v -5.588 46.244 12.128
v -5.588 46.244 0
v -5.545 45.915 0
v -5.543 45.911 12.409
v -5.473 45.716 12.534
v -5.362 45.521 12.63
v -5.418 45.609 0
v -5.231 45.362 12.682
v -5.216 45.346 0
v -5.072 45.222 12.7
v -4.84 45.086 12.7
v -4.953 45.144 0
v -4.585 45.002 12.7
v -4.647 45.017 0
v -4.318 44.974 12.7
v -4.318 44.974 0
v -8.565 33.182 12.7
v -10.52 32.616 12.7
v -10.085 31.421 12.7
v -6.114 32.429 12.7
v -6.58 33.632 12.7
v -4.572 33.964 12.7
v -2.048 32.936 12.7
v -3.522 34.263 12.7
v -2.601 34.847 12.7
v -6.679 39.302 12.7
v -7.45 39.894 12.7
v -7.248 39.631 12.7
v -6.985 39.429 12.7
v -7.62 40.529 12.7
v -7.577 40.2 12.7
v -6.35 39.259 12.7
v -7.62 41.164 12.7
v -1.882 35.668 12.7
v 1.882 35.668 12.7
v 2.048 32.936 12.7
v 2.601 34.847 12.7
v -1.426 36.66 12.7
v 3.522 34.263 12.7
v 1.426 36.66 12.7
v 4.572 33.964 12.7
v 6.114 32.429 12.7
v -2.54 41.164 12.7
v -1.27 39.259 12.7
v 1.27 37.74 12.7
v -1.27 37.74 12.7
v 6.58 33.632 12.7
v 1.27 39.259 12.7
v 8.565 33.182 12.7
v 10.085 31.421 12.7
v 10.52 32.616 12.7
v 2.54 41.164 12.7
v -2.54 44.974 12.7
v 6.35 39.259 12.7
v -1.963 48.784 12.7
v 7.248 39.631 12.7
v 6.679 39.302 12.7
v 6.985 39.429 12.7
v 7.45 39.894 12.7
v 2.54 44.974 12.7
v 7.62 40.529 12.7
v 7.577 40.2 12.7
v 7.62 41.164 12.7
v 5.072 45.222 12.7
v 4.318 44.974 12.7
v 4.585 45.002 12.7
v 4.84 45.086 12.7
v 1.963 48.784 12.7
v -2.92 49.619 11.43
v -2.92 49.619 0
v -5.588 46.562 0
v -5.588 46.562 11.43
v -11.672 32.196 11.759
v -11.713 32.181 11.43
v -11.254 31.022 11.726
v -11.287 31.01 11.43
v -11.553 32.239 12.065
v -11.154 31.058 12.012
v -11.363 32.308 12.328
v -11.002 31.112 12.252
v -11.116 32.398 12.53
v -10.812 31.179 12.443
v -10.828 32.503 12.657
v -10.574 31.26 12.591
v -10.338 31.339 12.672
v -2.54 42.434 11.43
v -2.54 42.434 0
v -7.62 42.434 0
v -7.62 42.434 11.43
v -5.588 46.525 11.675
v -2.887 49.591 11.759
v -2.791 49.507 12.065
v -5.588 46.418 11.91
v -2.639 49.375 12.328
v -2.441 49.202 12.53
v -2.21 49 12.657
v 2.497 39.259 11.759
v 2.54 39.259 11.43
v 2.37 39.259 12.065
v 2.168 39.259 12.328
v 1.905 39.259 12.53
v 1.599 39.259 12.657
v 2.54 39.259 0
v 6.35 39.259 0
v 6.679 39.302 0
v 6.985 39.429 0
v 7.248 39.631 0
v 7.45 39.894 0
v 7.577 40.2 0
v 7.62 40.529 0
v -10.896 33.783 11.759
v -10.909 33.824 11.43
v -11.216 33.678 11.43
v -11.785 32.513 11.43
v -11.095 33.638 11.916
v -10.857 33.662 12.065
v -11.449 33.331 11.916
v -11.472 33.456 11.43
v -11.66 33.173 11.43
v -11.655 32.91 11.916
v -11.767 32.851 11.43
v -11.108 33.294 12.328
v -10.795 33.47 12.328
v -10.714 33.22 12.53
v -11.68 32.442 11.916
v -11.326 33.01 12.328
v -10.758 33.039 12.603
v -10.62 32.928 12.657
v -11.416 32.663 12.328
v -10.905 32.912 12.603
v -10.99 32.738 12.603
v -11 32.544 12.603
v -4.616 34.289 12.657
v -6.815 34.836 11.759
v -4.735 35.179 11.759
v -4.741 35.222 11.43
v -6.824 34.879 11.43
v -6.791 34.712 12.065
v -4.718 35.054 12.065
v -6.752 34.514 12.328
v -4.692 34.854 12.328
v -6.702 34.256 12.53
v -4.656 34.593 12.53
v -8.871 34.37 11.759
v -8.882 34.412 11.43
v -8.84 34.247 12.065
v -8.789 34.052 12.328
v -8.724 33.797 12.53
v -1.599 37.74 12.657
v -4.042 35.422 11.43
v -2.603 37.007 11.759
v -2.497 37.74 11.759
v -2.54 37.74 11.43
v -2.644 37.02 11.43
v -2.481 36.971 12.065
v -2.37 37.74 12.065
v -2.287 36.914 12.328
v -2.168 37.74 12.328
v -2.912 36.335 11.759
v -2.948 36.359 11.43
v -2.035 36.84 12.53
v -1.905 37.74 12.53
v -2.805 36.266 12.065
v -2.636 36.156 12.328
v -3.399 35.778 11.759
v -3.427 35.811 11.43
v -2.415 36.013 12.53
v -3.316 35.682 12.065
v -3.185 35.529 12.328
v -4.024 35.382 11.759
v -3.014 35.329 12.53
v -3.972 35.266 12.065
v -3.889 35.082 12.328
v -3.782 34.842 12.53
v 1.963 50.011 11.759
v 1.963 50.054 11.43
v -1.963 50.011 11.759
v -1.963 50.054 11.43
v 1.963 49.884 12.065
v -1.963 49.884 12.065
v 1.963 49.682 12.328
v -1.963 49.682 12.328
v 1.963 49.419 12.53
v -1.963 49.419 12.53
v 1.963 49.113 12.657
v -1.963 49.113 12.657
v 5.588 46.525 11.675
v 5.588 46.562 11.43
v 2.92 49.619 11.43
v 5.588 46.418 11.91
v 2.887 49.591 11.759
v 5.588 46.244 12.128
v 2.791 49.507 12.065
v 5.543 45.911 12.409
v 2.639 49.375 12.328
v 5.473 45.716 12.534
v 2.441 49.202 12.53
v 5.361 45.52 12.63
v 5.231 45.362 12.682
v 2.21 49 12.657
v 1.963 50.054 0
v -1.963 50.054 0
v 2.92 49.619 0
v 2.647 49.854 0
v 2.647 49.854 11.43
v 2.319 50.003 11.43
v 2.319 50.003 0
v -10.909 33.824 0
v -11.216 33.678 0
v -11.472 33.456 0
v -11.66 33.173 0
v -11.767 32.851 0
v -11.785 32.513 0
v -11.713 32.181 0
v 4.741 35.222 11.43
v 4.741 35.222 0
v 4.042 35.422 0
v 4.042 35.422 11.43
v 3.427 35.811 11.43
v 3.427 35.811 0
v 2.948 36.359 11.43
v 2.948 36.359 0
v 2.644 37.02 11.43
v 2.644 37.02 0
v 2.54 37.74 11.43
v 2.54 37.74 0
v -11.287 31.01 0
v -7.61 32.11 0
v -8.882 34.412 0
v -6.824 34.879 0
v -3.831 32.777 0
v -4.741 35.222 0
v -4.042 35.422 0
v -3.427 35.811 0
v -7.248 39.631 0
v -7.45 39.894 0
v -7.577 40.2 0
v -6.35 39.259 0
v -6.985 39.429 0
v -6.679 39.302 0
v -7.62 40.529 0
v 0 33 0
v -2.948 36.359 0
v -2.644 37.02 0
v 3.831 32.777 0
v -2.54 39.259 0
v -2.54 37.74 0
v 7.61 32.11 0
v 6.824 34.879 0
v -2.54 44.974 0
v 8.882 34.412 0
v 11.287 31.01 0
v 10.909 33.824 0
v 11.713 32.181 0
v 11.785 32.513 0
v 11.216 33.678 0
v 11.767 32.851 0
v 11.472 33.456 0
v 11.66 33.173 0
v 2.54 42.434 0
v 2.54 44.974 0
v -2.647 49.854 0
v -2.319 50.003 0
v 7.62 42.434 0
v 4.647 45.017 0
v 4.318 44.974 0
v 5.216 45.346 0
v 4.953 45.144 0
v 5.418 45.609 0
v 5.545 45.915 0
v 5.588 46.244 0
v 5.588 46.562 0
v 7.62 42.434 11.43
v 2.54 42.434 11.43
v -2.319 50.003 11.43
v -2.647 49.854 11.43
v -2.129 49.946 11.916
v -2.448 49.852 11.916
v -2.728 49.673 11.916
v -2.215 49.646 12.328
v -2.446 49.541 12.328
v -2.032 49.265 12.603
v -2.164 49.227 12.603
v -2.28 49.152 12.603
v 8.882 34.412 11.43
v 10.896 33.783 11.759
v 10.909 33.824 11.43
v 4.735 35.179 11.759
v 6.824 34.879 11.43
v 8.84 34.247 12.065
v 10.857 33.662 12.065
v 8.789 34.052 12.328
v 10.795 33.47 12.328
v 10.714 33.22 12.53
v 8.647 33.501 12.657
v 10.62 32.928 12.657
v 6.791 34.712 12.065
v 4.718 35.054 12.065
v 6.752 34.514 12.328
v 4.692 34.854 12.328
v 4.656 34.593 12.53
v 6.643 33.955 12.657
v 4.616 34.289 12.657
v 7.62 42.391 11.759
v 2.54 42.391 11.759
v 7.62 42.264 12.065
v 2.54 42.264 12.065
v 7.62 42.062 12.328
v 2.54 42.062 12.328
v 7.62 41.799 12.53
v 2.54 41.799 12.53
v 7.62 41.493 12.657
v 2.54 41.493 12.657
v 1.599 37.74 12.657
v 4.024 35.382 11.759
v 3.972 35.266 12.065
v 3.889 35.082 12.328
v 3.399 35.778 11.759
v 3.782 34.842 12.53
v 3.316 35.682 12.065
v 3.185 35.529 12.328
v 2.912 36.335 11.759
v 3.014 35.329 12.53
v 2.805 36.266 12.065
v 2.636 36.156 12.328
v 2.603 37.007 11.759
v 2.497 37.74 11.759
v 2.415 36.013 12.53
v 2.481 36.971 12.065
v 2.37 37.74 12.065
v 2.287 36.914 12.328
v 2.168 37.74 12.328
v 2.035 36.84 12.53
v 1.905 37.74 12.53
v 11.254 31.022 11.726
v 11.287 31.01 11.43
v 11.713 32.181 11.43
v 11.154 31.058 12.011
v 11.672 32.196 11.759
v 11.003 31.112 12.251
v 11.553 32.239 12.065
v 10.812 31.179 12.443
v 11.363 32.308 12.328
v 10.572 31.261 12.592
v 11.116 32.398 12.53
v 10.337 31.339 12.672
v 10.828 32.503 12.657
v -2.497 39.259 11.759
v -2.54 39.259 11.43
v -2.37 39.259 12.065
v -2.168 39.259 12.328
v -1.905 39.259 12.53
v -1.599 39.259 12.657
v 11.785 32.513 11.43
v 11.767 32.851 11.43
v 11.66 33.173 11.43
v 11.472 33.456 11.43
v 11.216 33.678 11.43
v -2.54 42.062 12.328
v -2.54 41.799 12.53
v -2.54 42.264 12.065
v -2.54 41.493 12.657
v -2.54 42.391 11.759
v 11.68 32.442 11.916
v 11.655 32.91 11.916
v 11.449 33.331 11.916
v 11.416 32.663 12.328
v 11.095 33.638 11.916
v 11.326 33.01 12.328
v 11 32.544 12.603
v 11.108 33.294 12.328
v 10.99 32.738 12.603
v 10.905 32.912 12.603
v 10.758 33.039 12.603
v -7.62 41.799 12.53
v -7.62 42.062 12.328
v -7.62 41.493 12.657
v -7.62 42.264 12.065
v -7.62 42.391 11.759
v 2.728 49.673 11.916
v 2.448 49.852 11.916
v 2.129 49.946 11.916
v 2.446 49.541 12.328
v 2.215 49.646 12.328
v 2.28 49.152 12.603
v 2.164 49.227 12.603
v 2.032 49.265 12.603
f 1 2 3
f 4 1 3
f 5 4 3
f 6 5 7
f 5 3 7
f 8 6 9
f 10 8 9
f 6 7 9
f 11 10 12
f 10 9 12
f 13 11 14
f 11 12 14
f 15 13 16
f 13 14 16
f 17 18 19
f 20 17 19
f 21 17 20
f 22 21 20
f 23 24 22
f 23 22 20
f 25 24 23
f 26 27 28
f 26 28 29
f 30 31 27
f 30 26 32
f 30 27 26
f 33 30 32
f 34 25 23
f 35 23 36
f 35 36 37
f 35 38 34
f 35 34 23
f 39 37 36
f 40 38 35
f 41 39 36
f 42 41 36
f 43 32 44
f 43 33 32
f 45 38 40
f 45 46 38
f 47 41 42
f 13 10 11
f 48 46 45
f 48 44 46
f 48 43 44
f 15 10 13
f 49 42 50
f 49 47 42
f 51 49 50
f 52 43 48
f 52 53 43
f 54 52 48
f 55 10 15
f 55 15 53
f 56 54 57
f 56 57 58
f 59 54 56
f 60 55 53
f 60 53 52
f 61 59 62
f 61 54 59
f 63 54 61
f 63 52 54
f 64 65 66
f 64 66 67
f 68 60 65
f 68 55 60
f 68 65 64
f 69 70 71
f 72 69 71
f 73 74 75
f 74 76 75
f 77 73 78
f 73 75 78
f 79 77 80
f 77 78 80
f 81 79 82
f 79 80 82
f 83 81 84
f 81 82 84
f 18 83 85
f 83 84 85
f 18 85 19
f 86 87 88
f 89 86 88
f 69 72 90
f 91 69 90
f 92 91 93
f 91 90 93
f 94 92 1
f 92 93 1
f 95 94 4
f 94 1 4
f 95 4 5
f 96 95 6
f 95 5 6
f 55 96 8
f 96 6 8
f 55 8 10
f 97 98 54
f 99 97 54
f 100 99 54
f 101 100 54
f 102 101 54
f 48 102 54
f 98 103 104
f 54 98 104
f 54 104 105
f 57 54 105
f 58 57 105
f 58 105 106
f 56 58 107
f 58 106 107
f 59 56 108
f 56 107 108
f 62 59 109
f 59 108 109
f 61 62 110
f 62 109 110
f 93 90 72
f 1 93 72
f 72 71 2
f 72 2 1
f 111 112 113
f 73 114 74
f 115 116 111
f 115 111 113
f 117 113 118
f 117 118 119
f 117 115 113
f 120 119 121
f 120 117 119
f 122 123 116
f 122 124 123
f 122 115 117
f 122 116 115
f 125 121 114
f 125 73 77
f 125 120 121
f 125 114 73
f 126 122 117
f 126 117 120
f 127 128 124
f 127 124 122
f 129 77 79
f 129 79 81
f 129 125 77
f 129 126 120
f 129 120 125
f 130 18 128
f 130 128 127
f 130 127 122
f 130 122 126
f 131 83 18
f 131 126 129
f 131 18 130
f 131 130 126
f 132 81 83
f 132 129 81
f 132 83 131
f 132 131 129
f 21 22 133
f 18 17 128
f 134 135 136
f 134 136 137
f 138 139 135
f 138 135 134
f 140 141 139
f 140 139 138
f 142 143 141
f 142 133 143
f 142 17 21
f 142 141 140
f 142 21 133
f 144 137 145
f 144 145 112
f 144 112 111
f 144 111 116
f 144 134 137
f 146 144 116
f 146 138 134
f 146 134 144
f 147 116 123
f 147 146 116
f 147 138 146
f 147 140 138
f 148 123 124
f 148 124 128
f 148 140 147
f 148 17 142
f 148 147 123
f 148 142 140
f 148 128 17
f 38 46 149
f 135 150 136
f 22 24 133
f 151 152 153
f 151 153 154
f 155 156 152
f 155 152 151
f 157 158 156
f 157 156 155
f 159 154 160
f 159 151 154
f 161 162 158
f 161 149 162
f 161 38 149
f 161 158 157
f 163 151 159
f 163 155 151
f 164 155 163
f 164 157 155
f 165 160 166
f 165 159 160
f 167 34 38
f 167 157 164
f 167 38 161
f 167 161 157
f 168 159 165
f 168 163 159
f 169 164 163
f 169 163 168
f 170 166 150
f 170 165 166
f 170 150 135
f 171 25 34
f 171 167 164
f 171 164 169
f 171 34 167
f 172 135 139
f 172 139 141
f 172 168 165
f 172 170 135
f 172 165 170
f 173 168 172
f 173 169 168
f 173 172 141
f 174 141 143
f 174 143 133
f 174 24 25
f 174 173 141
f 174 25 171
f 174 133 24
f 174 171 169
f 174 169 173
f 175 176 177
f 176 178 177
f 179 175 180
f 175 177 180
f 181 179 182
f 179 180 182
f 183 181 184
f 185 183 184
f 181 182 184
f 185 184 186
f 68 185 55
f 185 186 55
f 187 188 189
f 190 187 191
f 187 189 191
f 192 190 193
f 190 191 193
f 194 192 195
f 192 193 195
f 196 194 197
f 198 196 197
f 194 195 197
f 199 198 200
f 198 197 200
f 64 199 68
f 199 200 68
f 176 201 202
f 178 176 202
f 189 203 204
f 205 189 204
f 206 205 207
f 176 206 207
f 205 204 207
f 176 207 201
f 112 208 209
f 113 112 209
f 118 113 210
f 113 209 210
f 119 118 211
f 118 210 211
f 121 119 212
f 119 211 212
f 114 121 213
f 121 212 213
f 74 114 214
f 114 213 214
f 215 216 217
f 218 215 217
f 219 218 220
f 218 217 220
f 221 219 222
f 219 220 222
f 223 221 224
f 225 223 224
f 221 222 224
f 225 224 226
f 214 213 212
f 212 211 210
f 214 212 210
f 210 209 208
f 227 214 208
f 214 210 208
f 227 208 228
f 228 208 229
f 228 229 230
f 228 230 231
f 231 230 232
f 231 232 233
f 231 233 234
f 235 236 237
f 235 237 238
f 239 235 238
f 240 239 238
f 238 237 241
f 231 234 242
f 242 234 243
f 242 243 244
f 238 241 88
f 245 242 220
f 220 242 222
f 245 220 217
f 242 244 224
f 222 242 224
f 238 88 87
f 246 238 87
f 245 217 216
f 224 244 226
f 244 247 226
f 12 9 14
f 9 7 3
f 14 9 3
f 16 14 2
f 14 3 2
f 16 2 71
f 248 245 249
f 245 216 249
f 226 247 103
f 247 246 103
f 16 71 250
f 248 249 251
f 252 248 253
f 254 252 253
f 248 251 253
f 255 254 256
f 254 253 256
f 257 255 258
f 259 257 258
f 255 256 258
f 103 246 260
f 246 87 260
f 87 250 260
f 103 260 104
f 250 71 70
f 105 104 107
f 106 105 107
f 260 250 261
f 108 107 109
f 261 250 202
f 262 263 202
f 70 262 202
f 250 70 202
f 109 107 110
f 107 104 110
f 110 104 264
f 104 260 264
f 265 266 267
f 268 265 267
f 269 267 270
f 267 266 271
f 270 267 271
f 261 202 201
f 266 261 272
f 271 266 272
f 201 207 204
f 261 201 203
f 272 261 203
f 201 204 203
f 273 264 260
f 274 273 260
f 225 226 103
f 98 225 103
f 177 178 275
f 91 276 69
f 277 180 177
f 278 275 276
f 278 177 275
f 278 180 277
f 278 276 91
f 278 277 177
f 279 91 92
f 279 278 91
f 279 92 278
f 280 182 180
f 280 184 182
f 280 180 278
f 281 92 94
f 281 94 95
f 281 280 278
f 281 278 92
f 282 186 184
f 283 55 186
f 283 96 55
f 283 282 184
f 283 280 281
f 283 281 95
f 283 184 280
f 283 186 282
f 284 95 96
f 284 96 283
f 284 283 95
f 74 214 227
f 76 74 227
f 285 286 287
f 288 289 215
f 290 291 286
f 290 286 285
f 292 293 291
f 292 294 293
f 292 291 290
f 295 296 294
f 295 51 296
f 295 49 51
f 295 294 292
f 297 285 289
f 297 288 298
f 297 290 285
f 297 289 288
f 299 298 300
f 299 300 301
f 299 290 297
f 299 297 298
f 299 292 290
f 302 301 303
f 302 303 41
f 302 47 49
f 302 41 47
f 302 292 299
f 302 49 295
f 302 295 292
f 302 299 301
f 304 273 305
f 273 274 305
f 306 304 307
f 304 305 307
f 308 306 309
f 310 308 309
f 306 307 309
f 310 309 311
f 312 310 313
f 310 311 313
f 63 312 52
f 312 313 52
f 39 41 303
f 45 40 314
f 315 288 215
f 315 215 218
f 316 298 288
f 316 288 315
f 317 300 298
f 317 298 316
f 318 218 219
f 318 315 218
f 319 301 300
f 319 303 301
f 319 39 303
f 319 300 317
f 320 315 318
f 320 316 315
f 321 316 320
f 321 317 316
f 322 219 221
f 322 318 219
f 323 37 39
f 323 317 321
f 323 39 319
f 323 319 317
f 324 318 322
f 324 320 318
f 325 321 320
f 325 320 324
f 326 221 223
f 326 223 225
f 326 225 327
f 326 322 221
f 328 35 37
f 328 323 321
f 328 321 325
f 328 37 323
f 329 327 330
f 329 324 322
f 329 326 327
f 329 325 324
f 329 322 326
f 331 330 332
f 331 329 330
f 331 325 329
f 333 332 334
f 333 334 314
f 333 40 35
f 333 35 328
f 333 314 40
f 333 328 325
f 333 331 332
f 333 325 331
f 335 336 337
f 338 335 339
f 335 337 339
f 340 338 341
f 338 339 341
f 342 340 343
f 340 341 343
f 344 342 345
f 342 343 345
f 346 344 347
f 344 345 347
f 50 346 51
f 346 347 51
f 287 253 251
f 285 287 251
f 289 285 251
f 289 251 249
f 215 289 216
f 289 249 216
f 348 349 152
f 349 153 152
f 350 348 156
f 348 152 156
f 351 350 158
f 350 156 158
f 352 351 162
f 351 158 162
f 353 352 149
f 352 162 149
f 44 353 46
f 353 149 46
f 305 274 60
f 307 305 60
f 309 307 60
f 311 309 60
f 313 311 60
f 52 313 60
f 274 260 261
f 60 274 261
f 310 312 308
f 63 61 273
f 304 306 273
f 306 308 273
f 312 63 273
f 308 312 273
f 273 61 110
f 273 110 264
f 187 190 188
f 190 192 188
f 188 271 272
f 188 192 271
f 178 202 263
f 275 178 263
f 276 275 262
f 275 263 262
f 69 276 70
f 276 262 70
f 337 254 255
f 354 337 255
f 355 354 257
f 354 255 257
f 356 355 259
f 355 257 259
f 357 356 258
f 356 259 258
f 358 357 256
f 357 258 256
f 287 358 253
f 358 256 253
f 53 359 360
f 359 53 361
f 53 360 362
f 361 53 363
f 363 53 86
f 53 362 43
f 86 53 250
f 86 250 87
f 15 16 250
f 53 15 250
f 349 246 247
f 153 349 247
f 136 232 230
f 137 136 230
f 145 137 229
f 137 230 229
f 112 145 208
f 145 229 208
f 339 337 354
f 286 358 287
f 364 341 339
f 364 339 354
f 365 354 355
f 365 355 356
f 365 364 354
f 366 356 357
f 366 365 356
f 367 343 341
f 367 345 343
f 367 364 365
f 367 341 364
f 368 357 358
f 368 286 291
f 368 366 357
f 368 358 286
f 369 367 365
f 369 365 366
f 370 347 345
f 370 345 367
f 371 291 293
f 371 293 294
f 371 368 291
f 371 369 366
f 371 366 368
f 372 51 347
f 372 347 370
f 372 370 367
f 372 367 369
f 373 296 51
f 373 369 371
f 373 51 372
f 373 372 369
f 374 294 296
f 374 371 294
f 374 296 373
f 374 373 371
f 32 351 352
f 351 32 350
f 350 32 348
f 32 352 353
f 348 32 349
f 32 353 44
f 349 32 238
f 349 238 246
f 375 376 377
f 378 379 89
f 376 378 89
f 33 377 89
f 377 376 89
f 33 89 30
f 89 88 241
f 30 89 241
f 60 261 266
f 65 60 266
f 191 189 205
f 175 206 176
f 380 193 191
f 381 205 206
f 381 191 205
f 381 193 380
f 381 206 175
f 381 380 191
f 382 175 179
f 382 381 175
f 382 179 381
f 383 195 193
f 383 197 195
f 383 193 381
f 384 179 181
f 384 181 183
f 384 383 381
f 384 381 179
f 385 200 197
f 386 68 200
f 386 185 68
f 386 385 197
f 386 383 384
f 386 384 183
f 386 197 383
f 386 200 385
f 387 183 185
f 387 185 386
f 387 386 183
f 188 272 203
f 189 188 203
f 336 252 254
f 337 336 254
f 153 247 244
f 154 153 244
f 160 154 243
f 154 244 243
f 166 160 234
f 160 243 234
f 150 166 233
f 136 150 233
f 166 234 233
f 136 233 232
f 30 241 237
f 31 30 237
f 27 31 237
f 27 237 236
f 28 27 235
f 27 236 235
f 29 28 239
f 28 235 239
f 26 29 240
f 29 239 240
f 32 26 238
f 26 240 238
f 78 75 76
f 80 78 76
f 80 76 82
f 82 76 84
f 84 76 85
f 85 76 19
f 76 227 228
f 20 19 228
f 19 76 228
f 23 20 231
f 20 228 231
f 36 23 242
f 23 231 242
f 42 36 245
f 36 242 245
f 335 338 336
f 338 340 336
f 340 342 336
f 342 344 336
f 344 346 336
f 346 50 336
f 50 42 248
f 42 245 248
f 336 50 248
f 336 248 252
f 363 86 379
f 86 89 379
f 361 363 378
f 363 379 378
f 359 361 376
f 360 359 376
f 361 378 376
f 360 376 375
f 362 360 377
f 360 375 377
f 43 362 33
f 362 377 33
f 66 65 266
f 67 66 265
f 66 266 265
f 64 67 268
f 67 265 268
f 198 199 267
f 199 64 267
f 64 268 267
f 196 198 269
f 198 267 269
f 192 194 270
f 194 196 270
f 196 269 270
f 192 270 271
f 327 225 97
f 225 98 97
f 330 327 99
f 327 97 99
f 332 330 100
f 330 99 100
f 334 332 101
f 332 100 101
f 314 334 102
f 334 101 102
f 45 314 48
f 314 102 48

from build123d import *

# Parameters (mm, degrees)
F1_DEPTH = 12.7
F2_R     = 1.27


with BuildPart() as f1:
    # F0 (on Top) → F1 (new body)
    with BuildSketch(Plane.XY):
        with BuildLine():
            ThreePointArc((-11.2866647297, 31.0098564859), (0, 33), (11.2866647297, 31.0098564859))
            Line((11.2866647297, 31.0098564859), (11.7129790451, 32.1811454409))
            ThreePointArc((11.7129790451, 32.1811454409), (11.6604357653, 33.1734751566), (10.9094104776, 33.8241978919))
            ThreePointArc((10.9094104776, 33.8241978919), (7.8564465257, 34.6607537135), (4.7411554622, 35.2223373001))
            ThreePointArc((4.7411554622, 35.2223373001), (3.167898391, 36.0676691962), (2.54, 37.7396343385))
            Line((2.54, 37.7396343385), (2.54, 39.2591184658))
            Line((2.54, 39.2591184658), (6.35, 39.2591184658))
            ThreePointArc((6.35, 39.2591184658), (7.2480256121, 39.6310928537), (7.62, 40.5291184658))
            Line((7.62, 40.5291184658), (7.62, 42.4341184658))
            Line((7.62, 42.4341184658), (2.54, 42.4341184658))
            Line((2.54, 42.4341184658), (2.54, 44.9741184658))
            Line((2.54, 44.9741184658), (4.318, 44.9741184658))
            ThreePointArc((4.318, 44.9741184658), (5.2160256121, 45.3460928537), (5.588, 46.2441184658))
            Line((5.588, 46.2441184658), (5.588, 46.5616184658))
            Line((5.588, 46.5616184658), (2.9195765878, 49.6191869589))
            ThreePointArc((2.9195765878, 49.6191869589), (2.488257012, 49.9402838921), (1.9627272727, 50.0541184658))
            Line((1.9627272727, 50.0541184658), (0, 50.0541184658))
            Line((0, 50.0541184658), (-1.9627272727, 50.0541184658))
            ThreePointArc((-1.9627272727, 50.0541184658), (-2.488257012, 49.9402838921), (-2.9195765878, 49.6191869589))
            Line((-2.9195765878, 49.6191869589), (-5.588, 46.5616184658))
            Line((-5.588, 46.5616184658), (-5.588, 46.2441184658))
            ThreePointArc((-5.588, 46.2441184658), (-5.2160256121, 45.3460928537), (-4.318, 44.9741184658))
            Line((-4.318, 44.9741184658), (-2.54, 44.9741184658))
            Line((-2.54, 44.9741184658), (-2.54, 42.4341184658))
            Line((-2.54, 42.4341184658), (-7.62, 42.4341184658))
            Line((-7.62, 42.4341184658), (-7.62, 40.5291184658))
            ThreePointArc((-7.62, 40.5291184658), (-7.2480256121, 39.6310928537), (-6.35, 39.2591184658))
            Line((-6.35, 39.2591184658), (-2.54, 39.2591184658))
            Line((-2.54, 39.2591184658), (-2.54, 37.7396343385))
            ThreePointArc((-2.54, 37.7396343385), (-3.167898391, 36.0676691962), (-4.7411554622, 35.2223373001))
            ThreePointArc((-4.7411554622, 35.2223373001), (-7.8564465257, 34.6607537135), (-10.9094104776, 33.8241978919))
            ThreePointArc((-10.9094104776, 33.8241978919), (-11.6604357653, 33.1734751566), (-11.7129790451, 32.1811454409))
            Line((-11.7129790451, 32.1811454409), (-11.2866647297, 31.0098564859))
        make_face()
    extrude(amount=F1_DEPTH)

    # F2
    f2_edges = [f1.edges().sort_by_distance(p)[0] for p in [
        (3.167898, 36.067669, 12.7),
        (-7.856447, 34.660754, 12.7),
        (-5.08, 42.434118, 12.7),
        (5.08, 42.434118, 12.7),
        (4.253788, 48.090403, 12.7),
    ]]
    fillet(f2_edges, radius=F2_R)


solid = f1.part
